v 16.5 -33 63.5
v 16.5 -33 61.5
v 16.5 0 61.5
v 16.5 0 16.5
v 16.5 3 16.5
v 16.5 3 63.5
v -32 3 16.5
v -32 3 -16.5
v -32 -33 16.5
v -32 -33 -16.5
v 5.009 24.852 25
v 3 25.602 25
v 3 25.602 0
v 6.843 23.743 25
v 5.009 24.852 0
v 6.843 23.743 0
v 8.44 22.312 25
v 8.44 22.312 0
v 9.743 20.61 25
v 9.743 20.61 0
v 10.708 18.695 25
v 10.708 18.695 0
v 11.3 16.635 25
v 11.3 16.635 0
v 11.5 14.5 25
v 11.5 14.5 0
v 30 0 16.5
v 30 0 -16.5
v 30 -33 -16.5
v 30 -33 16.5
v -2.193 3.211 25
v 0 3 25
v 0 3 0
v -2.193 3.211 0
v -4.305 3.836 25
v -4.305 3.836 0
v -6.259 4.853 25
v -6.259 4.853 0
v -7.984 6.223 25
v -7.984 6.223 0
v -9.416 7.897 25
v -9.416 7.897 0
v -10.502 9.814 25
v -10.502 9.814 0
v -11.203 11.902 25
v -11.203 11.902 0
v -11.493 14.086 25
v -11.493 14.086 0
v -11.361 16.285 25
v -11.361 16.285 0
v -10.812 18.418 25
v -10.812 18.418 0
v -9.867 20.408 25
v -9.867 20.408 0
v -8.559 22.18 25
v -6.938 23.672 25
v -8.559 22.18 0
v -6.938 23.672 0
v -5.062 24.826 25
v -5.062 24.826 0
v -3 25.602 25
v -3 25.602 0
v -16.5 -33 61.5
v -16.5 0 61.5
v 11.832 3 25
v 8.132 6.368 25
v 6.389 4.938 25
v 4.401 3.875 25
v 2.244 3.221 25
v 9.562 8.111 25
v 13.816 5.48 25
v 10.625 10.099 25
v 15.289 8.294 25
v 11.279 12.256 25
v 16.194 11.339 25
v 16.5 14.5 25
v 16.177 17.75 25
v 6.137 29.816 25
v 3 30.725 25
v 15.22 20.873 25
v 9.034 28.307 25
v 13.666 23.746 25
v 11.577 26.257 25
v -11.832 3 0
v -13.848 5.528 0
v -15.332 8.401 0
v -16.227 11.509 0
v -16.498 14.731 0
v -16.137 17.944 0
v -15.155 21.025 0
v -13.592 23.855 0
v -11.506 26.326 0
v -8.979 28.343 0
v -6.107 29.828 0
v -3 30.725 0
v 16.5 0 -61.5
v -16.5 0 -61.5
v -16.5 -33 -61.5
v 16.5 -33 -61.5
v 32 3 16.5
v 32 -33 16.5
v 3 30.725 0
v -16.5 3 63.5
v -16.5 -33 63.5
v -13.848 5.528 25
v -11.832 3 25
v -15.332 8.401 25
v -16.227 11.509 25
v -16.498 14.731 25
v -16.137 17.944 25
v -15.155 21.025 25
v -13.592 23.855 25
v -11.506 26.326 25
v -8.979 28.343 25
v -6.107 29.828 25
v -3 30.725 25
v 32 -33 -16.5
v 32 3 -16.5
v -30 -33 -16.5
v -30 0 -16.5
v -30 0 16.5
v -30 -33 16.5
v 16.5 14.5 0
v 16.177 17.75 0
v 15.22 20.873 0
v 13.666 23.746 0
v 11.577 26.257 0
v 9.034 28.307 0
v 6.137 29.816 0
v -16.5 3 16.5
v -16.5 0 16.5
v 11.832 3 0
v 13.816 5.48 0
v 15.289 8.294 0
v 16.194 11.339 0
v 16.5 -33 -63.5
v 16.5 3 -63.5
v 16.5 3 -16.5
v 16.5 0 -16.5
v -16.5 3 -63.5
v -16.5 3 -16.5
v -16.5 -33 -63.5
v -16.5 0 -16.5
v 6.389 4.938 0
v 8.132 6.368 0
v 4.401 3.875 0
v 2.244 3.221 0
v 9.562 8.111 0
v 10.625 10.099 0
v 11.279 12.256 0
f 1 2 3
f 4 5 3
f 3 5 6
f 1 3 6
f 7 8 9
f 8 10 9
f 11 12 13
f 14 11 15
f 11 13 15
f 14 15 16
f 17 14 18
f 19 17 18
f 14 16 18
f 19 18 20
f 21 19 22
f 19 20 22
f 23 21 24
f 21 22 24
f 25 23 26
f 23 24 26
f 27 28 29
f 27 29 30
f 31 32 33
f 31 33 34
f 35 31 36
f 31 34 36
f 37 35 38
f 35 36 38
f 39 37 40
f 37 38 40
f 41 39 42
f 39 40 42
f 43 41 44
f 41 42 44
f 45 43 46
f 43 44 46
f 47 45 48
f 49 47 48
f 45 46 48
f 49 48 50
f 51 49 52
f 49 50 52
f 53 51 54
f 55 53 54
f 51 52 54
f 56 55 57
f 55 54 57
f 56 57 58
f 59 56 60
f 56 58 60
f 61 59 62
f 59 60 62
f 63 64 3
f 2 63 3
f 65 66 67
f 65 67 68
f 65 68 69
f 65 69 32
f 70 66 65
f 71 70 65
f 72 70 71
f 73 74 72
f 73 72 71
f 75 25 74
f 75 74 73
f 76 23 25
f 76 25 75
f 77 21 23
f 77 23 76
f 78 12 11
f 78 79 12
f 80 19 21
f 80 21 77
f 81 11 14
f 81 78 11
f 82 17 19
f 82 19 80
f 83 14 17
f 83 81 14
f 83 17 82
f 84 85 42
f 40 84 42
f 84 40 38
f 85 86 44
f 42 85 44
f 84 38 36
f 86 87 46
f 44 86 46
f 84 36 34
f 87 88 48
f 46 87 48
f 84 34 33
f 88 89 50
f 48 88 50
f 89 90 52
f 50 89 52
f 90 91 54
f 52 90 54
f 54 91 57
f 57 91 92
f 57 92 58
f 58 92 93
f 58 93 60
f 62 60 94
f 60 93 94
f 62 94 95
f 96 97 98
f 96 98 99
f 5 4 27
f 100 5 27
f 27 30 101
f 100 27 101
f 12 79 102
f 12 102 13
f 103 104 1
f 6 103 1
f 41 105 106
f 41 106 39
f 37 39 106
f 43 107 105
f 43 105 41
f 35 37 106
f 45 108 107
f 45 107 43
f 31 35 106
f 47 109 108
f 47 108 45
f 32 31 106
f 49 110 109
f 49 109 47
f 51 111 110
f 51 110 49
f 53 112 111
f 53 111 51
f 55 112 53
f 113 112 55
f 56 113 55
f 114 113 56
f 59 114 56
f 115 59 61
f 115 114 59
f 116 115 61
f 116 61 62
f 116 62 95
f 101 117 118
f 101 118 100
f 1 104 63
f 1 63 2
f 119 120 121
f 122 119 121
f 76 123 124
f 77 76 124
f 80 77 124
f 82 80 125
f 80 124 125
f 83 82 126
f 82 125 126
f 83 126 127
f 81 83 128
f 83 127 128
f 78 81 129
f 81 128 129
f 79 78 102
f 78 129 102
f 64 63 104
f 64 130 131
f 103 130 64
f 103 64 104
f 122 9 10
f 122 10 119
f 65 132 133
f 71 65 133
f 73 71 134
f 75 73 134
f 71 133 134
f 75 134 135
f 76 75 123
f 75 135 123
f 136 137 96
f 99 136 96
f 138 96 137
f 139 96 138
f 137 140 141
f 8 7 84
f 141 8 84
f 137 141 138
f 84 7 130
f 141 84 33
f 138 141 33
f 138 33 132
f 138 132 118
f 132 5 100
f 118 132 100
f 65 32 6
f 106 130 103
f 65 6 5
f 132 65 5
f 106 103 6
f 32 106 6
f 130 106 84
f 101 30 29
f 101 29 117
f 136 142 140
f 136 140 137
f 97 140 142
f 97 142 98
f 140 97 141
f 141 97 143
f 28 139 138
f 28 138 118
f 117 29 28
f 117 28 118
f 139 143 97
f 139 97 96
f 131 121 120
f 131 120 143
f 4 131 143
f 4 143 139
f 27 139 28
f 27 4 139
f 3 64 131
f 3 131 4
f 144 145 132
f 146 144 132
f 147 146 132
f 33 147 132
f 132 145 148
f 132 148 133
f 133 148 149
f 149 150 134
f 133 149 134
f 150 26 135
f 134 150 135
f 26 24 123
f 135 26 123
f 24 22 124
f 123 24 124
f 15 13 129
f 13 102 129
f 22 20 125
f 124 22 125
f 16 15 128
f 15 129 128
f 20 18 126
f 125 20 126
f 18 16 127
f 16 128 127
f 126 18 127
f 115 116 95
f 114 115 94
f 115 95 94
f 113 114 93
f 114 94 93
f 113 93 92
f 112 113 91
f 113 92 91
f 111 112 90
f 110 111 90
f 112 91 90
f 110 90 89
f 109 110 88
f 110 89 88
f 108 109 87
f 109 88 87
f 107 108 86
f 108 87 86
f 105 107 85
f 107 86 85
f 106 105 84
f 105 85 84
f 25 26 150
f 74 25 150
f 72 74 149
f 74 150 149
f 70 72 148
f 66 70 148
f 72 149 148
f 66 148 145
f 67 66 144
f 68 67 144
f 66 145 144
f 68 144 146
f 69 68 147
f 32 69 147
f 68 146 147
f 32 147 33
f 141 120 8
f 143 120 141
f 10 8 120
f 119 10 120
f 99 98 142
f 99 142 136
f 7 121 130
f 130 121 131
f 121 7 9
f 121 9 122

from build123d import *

# Parameters (mm, degrees)
F0_W     = 33
F0_H     = 47
F0_W_2   = 15.5
F0_H_2   = 33
F1_DEPTH = 3
F2_W     = 33
F2_H     = 2
F2_W_2   = 2
F2_H_2   = 33
F3_DEPTH = 33
F5_DEPTH = 25


with BuildPart() as f1:
    # F0 (on Front) → F1 (new body)
    with BuildSketch(Plane.XZ):
        with Locations((0, 40)):
            Rectangle(F0_W, F0_H)
        with Locations((24.25, 0)):
            Rectangle(F0_W_2, F0_H_2)
        Rectangle(F0_W, F0_H_2)
        with Locations((-24.25, 0)):
            Rectangle(F0_W_2, F0_H_2)
        with Locations((0, -40)):
            Rectangle(F0_W, F0_H)
    extrude(amount=-F1_DEPTH)

    # F2 (on face) → F3 (join)
    with BuildSketch(Plane.XZ):
        with Locations((0, 62.5)):
            Rectangle(F2_W, F2_H)
        with Locations((-31, 0)):
            Rectangle(F2_W_2, F2_H_2)
        with Locations((0, -62.5)):
            Rectangle(F2_W, F2_H)
        with Locations((31, 0)):
            Rectangle(F2_W_2, F2_H_2)
    extrude(amount=F3_DEPTH)

    # F4 (on Top) → F5 (join)
    with BuildSketch(Plane.XY):
        with BuildLine():
            Line((-11.8321595662, 3), (0, 3))
            ThreePointArc((0, 3), (-11.4000157684, 12.9868441982), (-3, 25.6018016556))
            Line((-3, 25.6018016556), (-3, 30.7249807396))
            ThreePointArc((-3, 30.7249807396), (-15.7215418646, 19.5083052421), (-11.8321595662, 3))
        make_face()
        with BuildLine():
            ThreePointArc((3, 25.6018016556), (9.1309911839, 21.4910657271), (11.5, 14.5))
            ThreePointArc((11.5, 14.5), (8.1317279836, 6.3682720164), (0, 3))
            Line((0, 3), (11.8321595662, 3))
            ThreePointArc((11.8321595662, 3), (15.2885681612, 8.294382901), (16.5, 14.5))
            ThreePointArc((16.5, 14.5), (12.683650894, 25.0534354596), (3, 30.7249807396))
            Line((3, 30.7249807396), (3, 25.6018016556))
        make_face()
    extrude(amount=F5_DEPTH)


solid = f1.part
